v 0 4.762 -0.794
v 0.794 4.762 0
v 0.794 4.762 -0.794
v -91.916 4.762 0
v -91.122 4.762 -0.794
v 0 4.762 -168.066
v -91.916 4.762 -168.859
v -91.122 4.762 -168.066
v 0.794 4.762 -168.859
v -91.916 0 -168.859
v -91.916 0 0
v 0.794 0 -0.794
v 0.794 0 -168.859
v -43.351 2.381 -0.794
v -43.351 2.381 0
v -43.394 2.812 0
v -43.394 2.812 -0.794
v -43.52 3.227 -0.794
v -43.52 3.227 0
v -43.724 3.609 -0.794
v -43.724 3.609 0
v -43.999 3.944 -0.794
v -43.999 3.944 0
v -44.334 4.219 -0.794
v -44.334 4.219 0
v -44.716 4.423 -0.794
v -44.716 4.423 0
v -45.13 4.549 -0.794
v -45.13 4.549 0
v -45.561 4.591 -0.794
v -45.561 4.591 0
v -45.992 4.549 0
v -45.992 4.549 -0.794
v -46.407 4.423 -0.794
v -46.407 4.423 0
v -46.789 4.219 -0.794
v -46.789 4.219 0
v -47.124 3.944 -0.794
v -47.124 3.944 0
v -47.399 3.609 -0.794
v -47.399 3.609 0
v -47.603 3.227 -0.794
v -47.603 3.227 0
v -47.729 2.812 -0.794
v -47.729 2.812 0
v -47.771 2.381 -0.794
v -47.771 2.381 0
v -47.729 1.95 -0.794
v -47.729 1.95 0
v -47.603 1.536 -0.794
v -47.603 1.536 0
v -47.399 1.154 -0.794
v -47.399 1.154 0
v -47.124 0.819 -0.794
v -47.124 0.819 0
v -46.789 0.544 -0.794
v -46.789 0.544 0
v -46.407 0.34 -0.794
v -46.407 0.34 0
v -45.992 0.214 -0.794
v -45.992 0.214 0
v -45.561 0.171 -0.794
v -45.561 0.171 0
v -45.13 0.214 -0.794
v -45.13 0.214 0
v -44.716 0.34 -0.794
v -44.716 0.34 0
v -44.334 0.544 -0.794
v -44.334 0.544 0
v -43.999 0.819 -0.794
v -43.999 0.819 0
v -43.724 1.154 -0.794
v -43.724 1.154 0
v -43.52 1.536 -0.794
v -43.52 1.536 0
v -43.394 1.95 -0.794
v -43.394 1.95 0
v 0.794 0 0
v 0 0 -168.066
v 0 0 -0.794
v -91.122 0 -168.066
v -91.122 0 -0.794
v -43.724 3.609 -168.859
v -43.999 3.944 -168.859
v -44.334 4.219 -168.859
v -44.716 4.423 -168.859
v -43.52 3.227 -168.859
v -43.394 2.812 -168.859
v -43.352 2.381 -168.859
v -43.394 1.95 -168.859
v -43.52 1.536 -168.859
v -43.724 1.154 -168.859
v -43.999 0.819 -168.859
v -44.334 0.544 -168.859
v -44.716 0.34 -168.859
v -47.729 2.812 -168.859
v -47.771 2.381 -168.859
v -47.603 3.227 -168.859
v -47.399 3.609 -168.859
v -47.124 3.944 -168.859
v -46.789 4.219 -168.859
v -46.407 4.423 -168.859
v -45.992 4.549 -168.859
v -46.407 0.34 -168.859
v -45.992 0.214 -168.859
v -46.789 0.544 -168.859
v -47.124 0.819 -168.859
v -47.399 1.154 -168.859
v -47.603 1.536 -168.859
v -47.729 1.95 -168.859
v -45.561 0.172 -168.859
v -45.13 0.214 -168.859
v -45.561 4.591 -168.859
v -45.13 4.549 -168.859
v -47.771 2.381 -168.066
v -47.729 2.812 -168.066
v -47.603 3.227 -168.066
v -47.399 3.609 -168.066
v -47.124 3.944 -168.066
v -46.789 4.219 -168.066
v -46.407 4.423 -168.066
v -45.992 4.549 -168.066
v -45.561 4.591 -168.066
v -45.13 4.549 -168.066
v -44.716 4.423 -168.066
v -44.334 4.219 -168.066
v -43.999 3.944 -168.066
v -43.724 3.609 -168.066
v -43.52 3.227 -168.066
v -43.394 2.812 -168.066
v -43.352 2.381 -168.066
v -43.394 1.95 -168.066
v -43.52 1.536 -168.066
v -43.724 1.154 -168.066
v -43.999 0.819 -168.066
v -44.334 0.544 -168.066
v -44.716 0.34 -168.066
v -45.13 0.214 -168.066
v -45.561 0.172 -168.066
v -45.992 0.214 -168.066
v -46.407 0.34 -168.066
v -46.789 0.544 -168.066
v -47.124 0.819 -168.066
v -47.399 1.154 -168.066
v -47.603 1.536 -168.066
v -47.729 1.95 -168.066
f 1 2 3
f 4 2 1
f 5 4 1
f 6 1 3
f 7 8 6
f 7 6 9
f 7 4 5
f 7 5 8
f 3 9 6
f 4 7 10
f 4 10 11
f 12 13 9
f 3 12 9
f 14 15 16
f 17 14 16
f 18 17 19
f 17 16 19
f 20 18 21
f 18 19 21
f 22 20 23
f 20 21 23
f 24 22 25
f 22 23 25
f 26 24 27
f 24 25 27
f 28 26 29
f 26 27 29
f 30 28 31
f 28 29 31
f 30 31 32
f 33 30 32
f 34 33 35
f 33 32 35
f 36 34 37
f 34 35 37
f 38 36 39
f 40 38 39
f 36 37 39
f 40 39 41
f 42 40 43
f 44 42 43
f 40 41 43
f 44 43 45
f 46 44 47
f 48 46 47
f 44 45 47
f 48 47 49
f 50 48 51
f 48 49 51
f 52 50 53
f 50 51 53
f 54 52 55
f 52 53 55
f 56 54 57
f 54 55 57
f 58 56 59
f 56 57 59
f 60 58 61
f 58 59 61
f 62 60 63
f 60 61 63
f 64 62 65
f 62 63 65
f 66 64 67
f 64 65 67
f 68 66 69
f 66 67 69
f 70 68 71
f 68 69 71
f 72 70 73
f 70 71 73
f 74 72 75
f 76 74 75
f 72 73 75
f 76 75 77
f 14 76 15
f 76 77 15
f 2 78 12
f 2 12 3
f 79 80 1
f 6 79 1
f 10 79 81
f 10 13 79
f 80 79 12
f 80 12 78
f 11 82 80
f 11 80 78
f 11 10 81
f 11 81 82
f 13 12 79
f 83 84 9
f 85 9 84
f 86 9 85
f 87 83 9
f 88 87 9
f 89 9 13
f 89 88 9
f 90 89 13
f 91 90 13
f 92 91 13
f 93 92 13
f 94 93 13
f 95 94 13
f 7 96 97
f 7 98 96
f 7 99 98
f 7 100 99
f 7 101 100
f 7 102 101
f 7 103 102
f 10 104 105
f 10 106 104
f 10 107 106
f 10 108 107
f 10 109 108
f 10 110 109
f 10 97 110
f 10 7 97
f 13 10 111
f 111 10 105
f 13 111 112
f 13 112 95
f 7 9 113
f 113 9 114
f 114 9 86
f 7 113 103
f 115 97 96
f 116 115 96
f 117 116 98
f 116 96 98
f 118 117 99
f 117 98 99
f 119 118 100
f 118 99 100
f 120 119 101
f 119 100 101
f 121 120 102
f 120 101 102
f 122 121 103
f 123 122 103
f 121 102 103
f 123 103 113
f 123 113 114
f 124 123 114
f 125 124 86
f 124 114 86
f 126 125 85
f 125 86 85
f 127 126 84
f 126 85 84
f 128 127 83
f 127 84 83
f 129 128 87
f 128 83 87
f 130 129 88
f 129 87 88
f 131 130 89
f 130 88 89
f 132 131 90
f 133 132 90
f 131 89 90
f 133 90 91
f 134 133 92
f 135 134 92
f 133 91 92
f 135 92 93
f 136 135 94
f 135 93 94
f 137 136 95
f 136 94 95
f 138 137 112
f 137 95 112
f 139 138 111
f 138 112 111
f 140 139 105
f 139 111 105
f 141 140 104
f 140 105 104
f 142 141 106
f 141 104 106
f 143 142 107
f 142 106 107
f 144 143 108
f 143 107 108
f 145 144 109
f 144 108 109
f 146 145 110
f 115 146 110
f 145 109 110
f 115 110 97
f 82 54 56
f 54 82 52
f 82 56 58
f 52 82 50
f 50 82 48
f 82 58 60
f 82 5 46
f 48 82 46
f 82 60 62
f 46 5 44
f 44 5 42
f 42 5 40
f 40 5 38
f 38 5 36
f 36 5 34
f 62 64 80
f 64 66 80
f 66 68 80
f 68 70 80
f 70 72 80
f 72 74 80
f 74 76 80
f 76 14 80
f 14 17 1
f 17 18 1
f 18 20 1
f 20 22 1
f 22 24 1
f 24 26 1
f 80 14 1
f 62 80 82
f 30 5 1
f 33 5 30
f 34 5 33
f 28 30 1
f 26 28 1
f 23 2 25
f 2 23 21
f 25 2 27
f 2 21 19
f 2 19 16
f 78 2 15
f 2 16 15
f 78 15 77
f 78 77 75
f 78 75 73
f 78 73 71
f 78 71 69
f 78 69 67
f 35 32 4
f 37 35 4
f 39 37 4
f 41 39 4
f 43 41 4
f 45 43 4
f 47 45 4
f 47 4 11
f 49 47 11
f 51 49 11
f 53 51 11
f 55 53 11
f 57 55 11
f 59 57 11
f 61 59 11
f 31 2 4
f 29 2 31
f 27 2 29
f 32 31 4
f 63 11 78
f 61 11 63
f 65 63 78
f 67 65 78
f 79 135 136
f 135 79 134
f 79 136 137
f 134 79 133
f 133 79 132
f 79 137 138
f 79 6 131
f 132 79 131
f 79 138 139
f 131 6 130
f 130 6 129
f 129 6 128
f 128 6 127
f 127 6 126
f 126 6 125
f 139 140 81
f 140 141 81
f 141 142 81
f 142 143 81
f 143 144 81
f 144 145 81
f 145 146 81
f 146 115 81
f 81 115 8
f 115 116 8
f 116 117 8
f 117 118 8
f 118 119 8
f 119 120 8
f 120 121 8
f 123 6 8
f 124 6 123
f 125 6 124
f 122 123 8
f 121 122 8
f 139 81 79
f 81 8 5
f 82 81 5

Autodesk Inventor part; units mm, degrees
ref_plane "YZ Plane" through (0, 0, 0) normal (1, 0, 0) x (0, 1, 0)
ref_plane "XZ Plane" through (0, 0, 0) normal (0, 1, 0) x (-1, 0, 0)
ref_plane "XY Plane" through (0, 0, 0) normal (0, 0, 1) x (1, 0, 0)
sketch "Sketch1" plane through (0, 0, 0) normal (1, 0, 0) x (0, 1, 0)
  line L0 (0, 0) -> (4.7625, 0)
  line L1 (4.7625, 0) -> (4.7625, -168.8592)
  line L2 (4.7625, -168.8592) -> (0, -168.8592)
  line L3 (0, -168.8592) -> (0, 0)
  dimension "d1" = 4.7625
  dimension "d2" = 168.8592
extrude "Extrusion1" add sketch "Sketch1" along normal blind 0.7937
sketch "Sketch2" plane through (0, 0, -168.8592) normal (0, 0, -1) x (-1, 0, 0)
  line L0 (-0.7937, 0) -> (-0.7937, 4.7625) projected
  line L1 (-0.7937, 0) -> (91.9162, 0)
  line L2 (91.9162, 0) -> (91.9162, 4.7625)
  line L3 (91.9162, 4.7625) -> (-0.7937, 4.7625)
  line L4 (-0.7937, 4.7625) -> (-0.7937, 0)
  point P0 (0, 0)
  dimension "d5" = 92.71
  dimension "d6" = 4.7625
extrude "Extrusion2" add sketch "Sketch2" against normal blind 0.7937
sketch "Sketch3" plane through (-91.9162, 0, -168.8592) normal (-1, 0, 0) x (0, 0, 1)
  line L0 (168.8592, 4.7625) -> (168.8592, 0) projected
  line L1 (0, 0) -> (168.8592, 0)
  line L2 (168.8592, 0) -> (168.8592, 4.7625)
  line L3 (168.8592, 4.7625) -> (0, 4.7625)
  line L4 (0, 4.7625) -> (0, 0)
extrude "Extrusion3" add sketch "Sketch3" against normal blind 0.7937
sketch "Sketch4" plane through (-91.9162, 0, 0) normal (0, 0, 1) x (1, 0, 0)
  line L0 (0, 0) -> (0, 4.7625) projected
  line L1 (91.9162, 4.7625) -> (92.71, 4.7625) projected
  line L2 (0, 0) -> (92.71, 0)
  line L3 (92.71, 0) -> (92.71, 4.7625)
  line L4 (92.71, 4.7625) -> (0, 4.7625)
  line L5 (0, 4.7625) -> (0, 0)
  point P0 (91.9162, 0)
extrude "Extrusion4" add sketch "Sketch4" against normal blind 0.7937
sketch "Sketch7" plane through (-36.0362, 0, 0) normal (0, 0, 1) x (1, 0, 0)
  circle A0 centre (-9.525, 2.3812) radius 2.2098
  point P0 (-55.88, 0)
  point P1 (36.83, 0)
extrude "Extrusion5" cut sketch "Sketch7" against normal blind 0.7937
sketch "Sketch6" plane through (0.7937, 0, -168.8592) normal (0, 0, -1) x (-1, 0, 0)
  circle A0 centre (46.355, 2.3813) radius 2.2098
  point P0 (0, 0)
  point P1 (92.71, 0)
extrude "Extrusion6" cut sketch "Sketch6" against normal blind 0.7937
properties part number "Back rubber bands"
